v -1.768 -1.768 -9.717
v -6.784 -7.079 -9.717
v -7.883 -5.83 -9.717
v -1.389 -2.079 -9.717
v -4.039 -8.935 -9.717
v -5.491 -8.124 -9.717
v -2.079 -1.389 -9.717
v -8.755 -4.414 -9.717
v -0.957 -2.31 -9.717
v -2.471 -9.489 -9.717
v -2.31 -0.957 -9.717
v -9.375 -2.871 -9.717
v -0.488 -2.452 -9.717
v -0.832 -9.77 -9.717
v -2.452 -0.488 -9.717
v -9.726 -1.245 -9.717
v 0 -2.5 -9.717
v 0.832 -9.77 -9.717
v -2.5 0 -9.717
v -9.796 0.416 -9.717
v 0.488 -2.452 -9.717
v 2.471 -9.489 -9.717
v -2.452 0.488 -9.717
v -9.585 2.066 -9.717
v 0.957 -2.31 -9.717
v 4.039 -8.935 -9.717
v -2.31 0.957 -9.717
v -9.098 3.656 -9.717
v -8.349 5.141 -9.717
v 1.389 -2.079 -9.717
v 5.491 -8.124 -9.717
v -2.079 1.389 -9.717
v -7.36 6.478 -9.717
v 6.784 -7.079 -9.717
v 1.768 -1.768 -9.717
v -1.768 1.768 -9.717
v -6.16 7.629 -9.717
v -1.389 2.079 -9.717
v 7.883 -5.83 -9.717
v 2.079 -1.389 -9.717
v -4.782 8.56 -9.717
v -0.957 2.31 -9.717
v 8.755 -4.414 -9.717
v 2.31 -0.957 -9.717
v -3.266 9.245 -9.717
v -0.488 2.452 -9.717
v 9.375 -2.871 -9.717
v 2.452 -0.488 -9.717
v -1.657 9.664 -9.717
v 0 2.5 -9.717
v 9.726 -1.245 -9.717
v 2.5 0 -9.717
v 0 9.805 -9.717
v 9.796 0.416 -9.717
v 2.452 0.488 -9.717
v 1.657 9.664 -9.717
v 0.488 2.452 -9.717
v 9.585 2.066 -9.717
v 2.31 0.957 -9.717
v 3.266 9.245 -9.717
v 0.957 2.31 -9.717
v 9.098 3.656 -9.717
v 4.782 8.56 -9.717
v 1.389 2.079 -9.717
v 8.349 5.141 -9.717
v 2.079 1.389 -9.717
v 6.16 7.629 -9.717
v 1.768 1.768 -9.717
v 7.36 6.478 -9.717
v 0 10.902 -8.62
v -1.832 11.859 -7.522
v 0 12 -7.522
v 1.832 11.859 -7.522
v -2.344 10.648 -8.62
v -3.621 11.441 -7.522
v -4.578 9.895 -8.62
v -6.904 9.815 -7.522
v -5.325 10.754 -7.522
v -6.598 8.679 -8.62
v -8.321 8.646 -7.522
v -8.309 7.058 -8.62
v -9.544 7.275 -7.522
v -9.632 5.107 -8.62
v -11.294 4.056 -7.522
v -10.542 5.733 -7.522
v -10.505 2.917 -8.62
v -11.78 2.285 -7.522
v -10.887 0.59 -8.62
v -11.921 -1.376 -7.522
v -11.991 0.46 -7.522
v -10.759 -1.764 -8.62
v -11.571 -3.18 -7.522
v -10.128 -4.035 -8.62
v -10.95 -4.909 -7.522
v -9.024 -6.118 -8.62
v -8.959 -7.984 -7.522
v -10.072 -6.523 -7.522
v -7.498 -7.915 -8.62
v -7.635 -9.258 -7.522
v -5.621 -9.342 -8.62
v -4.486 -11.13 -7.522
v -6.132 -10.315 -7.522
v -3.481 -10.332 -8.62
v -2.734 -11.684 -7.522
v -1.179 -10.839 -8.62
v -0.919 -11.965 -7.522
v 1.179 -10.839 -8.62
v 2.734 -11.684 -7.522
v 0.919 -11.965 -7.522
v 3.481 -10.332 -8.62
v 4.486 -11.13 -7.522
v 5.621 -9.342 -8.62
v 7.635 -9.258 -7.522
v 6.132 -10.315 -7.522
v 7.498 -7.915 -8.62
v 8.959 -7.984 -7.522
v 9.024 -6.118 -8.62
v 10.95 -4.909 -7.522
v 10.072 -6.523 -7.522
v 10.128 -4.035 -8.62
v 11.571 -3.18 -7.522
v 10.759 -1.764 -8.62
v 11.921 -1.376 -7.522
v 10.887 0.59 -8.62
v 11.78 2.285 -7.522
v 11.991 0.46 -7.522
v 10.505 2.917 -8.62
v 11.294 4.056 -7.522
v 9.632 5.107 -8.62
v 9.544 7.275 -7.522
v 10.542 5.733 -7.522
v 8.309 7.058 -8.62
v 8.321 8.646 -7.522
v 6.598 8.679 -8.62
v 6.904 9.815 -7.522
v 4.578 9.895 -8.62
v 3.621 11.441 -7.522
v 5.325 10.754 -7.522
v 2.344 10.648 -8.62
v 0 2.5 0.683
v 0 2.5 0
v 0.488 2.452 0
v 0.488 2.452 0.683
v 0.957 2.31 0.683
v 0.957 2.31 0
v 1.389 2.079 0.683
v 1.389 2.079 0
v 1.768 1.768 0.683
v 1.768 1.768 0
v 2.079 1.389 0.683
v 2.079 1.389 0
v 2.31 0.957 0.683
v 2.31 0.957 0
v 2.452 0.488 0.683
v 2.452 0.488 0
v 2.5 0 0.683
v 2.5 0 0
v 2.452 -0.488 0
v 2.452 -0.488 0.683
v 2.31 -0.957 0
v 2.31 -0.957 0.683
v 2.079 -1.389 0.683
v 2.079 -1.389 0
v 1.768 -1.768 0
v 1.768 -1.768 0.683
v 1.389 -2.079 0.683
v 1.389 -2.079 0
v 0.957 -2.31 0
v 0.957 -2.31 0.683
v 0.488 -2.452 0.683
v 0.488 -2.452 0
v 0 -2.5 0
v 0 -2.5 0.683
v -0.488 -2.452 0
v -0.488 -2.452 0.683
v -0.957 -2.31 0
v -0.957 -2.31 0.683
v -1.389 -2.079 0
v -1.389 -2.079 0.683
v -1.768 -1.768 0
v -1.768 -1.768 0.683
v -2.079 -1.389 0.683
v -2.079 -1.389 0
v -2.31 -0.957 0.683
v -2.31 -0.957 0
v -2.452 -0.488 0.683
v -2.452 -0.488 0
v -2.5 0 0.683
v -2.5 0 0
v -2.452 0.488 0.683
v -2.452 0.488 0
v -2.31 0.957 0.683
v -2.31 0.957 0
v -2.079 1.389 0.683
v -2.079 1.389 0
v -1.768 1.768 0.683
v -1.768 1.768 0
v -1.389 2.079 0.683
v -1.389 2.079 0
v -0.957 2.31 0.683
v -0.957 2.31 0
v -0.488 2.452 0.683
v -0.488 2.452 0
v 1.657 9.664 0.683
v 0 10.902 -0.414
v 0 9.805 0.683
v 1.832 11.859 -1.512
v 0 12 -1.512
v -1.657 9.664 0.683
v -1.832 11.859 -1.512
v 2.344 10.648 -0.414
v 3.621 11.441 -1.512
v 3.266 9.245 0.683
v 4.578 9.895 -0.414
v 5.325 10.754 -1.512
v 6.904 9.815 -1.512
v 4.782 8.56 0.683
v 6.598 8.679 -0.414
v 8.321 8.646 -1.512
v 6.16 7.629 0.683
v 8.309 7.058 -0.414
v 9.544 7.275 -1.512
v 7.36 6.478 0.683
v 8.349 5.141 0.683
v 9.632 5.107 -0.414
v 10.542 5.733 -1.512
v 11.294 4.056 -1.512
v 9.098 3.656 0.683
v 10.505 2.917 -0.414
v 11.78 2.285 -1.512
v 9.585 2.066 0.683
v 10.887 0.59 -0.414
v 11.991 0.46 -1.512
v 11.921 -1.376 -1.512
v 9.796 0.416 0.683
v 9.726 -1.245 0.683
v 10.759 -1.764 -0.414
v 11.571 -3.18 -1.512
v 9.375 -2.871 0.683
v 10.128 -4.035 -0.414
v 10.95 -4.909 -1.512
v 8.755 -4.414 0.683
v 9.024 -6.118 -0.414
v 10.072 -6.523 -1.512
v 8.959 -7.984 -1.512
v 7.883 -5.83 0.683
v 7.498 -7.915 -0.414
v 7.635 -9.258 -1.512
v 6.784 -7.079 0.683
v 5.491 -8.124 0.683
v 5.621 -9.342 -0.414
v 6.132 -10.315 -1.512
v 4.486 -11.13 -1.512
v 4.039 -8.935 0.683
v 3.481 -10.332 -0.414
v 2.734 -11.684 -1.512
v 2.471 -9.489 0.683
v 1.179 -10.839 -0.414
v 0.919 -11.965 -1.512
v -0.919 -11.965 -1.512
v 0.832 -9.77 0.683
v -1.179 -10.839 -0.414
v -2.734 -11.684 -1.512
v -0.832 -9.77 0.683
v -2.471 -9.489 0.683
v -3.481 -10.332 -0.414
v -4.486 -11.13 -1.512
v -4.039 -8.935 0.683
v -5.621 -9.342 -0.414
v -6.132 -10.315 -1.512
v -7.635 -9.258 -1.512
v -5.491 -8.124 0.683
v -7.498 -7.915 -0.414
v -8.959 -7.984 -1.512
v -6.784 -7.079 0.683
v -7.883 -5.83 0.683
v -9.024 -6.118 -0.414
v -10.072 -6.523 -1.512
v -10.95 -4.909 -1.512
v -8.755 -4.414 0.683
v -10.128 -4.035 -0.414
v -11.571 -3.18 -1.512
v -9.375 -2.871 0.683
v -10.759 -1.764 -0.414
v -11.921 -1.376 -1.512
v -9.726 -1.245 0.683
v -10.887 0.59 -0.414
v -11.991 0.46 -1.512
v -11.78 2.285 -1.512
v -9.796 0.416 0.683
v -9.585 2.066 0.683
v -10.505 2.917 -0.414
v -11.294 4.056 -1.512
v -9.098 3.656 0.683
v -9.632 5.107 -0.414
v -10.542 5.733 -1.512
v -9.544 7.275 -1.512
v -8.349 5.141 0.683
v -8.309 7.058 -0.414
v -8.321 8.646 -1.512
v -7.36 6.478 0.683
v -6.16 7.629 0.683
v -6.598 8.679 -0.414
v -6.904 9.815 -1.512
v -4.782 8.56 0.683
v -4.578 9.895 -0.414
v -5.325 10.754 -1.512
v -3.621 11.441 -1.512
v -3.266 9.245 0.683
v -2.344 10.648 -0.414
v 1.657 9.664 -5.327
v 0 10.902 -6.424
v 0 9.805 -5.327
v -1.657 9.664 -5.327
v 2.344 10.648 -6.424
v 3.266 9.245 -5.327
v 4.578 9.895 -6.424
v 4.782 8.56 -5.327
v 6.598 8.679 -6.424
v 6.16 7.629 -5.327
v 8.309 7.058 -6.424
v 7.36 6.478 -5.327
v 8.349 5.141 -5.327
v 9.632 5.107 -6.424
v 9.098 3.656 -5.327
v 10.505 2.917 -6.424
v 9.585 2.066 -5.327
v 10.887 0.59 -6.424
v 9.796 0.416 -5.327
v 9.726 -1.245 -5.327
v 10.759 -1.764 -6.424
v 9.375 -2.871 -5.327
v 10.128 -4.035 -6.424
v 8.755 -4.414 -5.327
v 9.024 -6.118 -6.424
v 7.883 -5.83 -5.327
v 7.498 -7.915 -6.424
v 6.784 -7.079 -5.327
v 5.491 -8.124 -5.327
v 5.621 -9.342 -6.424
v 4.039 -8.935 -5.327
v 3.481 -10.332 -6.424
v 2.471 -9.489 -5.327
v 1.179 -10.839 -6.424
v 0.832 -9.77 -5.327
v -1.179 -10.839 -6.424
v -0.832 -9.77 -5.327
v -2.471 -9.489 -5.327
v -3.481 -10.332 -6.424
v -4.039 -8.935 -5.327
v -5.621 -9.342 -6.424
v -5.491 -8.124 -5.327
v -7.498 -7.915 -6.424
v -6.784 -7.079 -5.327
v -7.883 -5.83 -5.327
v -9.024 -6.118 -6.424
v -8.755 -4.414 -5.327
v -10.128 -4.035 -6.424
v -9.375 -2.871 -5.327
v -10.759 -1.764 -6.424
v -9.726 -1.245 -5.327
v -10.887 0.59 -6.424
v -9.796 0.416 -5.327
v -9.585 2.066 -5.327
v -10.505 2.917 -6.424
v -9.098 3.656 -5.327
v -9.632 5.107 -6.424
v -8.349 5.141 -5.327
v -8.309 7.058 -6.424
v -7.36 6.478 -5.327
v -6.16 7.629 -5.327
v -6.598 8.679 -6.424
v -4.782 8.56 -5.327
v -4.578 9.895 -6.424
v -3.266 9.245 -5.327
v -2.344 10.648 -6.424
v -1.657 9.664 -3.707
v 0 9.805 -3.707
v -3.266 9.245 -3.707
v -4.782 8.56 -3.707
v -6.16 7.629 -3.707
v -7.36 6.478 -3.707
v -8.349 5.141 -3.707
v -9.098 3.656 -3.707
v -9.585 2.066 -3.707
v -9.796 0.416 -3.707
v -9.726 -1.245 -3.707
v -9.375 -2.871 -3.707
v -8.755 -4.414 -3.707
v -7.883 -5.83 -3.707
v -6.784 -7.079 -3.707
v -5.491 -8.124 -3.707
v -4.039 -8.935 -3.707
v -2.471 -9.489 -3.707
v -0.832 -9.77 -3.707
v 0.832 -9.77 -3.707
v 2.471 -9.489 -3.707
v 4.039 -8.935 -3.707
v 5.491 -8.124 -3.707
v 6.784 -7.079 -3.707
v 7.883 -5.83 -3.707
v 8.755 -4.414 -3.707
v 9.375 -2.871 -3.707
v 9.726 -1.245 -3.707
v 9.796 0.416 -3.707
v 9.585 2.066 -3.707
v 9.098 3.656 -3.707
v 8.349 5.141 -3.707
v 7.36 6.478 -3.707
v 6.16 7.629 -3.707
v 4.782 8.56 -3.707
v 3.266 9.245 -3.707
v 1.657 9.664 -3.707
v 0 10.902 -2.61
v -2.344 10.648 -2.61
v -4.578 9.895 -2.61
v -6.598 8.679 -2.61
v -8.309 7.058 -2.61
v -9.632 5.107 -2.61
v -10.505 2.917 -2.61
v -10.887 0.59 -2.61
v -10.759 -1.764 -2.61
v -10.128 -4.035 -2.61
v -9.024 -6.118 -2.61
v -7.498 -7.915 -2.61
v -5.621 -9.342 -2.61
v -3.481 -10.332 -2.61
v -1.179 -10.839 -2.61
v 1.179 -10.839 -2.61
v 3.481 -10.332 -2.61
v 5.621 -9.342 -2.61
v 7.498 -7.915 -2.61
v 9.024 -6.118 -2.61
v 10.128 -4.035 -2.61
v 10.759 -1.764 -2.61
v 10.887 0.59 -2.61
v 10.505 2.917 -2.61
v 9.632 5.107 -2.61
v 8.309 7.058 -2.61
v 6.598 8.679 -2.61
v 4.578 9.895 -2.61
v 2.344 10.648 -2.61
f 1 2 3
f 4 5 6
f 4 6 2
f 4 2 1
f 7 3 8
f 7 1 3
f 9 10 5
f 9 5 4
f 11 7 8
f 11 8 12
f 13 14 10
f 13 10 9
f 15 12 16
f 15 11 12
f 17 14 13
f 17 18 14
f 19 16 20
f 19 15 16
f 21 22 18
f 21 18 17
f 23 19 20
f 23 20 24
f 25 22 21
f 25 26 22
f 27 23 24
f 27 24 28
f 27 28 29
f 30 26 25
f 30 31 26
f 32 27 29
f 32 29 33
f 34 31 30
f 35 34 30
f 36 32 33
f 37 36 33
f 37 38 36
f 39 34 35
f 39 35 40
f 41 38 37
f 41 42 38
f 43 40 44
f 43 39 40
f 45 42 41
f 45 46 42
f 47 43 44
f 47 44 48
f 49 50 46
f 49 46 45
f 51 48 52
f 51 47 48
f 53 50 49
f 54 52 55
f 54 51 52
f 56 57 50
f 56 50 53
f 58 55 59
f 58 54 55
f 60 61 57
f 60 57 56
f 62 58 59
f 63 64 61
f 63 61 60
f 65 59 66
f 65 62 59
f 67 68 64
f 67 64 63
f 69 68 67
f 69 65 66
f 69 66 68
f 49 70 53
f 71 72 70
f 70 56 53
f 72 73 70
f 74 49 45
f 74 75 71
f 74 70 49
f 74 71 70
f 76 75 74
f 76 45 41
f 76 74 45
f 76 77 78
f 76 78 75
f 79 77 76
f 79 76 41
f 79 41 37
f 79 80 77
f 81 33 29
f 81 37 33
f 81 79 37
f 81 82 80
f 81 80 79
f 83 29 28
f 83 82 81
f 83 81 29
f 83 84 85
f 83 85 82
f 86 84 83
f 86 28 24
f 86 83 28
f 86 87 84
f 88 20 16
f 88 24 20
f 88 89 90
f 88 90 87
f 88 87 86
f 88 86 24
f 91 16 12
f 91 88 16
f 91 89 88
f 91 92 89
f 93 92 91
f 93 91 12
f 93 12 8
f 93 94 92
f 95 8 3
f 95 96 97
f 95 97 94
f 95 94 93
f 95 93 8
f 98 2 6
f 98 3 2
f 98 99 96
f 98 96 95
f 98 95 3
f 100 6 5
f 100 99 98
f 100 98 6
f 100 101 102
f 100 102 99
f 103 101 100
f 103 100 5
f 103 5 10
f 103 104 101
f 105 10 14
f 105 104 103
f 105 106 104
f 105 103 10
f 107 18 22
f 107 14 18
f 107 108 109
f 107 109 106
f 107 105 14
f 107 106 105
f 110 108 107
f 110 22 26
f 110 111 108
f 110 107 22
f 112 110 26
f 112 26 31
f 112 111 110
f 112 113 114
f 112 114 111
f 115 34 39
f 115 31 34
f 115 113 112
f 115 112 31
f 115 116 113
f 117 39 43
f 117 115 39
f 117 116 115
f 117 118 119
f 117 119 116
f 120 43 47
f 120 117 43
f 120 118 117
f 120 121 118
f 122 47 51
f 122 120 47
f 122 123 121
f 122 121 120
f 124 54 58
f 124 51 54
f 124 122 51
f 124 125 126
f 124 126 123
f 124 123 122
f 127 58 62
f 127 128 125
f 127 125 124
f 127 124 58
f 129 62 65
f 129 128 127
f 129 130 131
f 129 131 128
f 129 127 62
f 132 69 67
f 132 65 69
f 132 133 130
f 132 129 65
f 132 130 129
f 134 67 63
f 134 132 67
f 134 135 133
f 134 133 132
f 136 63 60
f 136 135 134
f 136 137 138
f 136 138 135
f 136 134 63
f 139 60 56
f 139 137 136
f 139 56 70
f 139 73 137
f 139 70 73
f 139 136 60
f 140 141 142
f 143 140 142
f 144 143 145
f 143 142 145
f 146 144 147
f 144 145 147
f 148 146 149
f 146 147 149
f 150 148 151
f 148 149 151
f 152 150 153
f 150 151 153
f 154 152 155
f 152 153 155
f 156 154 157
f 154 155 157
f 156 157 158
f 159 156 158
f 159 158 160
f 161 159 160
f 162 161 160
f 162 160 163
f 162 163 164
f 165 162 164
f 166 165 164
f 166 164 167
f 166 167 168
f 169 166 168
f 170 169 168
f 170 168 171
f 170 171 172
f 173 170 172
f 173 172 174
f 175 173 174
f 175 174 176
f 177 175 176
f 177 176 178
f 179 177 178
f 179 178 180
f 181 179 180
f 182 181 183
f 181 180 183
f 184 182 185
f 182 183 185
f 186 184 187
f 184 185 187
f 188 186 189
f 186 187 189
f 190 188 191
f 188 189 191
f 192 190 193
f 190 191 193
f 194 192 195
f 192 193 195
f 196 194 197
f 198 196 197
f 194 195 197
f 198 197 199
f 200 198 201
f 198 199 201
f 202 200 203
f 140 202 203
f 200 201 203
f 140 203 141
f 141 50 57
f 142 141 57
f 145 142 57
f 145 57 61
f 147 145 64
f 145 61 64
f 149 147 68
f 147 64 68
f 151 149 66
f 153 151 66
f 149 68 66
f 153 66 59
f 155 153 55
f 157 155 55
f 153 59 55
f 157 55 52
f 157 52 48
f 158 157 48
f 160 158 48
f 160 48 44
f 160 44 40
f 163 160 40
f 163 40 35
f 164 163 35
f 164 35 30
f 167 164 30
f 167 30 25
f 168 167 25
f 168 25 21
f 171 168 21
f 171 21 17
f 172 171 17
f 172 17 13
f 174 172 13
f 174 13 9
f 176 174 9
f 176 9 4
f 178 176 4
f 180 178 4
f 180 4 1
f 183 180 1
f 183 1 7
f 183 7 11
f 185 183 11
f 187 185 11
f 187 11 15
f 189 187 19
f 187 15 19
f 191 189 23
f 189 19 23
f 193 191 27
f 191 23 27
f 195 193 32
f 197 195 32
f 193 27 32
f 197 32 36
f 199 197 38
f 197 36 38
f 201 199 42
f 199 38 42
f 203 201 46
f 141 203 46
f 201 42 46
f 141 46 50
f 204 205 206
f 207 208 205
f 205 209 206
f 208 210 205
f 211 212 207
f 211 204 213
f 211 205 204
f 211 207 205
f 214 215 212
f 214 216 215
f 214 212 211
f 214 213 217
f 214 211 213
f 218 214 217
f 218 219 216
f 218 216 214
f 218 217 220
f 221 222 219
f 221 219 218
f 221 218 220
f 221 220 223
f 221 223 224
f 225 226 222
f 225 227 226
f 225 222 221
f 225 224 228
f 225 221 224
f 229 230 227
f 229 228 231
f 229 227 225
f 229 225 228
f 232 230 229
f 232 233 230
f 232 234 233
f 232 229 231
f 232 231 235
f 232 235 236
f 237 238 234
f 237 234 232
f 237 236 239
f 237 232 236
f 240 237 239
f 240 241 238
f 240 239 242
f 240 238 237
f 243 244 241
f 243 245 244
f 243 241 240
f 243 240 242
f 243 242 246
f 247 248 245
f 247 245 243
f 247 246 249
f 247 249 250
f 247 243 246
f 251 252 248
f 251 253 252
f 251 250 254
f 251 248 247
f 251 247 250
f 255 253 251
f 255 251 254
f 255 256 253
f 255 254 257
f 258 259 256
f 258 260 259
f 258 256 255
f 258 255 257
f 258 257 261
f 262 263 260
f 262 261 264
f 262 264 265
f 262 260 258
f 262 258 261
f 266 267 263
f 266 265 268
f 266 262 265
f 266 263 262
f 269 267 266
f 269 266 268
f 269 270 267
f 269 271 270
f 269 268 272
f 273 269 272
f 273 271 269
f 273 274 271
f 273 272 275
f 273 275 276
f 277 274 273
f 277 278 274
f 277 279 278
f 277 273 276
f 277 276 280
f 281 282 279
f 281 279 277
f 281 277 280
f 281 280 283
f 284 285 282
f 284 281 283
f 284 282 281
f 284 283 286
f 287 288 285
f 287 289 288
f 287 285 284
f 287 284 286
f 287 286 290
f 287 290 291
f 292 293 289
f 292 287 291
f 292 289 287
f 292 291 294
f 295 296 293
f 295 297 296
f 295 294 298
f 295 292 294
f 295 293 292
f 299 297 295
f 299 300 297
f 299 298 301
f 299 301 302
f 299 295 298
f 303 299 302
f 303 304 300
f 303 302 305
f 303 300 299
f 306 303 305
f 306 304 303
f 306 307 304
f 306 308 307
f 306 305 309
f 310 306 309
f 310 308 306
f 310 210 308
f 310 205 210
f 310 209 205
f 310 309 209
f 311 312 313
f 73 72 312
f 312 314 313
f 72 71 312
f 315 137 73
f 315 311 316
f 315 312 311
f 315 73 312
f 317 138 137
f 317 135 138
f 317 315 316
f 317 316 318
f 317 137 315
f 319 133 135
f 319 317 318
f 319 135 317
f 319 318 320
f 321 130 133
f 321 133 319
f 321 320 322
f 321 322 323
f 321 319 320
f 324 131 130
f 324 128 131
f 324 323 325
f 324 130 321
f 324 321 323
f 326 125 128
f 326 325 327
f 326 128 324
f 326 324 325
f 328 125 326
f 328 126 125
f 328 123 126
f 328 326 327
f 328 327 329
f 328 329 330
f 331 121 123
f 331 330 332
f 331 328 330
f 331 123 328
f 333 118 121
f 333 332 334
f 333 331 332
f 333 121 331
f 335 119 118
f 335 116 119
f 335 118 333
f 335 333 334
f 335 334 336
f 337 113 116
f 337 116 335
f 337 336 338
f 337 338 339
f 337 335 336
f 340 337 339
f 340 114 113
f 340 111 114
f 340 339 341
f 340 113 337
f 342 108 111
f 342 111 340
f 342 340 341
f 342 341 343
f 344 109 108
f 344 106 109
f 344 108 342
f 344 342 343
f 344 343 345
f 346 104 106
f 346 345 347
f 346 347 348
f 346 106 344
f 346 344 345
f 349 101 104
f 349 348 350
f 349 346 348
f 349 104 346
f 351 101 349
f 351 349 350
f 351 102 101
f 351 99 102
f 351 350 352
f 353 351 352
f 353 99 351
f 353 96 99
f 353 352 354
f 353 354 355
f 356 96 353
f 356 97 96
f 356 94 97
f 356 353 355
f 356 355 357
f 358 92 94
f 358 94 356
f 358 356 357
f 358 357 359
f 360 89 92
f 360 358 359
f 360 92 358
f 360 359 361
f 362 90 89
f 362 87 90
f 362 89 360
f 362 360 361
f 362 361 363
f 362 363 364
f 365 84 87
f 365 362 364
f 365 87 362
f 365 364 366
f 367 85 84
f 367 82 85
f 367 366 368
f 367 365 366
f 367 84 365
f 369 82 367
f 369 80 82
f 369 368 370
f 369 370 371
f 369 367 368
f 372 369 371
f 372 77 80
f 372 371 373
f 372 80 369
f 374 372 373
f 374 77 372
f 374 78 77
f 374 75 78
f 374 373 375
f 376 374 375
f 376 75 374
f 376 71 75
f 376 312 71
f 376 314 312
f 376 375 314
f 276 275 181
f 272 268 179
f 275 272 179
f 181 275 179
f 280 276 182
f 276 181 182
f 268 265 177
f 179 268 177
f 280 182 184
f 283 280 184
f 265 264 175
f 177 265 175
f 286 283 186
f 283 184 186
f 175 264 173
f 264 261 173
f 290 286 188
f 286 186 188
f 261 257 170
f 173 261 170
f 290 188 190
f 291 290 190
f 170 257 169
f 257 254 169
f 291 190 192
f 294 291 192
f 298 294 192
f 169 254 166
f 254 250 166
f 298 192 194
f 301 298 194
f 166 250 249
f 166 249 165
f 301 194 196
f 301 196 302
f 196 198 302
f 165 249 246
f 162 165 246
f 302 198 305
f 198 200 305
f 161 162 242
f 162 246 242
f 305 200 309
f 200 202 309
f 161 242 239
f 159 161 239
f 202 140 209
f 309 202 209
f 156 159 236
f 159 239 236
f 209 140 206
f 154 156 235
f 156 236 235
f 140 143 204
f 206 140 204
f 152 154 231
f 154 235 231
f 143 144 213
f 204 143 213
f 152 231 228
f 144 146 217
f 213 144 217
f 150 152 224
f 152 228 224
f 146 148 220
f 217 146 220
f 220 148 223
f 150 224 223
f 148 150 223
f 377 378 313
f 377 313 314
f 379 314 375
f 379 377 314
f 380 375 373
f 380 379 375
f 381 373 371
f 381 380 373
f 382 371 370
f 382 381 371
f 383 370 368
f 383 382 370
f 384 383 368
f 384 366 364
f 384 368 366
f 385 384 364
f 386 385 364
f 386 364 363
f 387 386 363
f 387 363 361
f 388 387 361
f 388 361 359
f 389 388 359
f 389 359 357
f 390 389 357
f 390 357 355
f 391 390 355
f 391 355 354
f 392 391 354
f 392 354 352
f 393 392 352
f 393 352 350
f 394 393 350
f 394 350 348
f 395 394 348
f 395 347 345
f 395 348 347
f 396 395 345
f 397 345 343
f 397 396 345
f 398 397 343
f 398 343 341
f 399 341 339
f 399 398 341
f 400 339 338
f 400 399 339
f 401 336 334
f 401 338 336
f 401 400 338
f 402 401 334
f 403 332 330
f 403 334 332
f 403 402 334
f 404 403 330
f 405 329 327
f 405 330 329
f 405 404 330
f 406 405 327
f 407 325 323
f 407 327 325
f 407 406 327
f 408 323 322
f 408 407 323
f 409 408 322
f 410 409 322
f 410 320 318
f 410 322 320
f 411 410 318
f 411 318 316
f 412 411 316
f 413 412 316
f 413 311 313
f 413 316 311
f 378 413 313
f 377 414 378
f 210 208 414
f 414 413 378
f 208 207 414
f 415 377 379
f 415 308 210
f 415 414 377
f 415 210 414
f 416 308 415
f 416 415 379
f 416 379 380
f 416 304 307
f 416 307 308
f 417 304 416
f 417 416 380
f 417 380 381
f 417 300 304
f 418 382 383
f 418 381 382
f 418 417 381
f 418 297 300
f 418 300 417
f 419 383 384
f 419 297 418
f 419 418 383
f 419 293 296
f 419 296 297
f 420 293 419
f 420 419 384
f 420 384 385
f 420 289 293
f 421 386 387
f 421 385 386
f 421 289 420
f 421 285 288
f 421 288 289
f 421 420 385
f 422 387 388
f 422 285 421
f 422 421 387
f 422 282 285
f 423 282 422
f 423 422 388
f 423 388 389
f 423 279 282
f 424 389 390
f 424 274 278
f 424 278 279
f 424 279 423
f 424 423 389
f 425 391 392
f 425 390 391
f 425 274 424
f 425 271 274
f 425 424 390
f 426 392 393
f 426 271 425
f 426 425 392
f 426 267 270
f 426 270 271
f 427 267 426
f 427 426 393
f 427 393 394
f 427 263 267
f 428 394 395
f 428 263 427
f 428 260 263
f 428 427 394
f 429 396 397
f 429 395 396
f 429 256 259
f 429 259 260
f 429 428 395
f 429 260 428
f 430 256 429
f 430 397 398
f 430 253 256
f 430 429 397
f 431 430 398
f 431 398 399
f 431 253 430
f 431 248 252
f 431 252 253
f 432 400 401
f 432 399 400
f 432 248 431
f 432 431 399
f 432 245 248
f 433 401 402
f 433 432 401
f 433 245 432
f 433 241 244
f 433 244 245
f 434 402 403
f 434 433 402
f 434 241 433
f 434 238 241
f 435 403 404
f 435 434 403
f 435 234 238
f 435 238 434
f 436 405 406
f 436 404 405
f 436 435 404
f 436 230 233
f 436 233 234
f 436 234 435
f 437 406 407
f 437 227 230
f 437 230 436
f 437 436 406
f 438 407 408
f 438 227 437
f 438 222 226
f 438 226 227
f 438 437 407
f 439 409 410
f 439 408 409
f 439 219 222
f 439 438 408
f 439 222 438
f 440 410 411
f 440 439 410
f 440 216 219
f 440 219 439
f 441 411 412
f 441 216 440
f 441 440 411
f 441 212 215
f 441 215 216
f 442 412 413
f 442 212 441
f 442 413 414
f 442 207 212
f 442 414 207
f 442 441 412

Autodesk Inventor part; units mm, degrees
ref_plane "YZ Plane" through (0, 0, 0) normal (1, 0, 0) x (0, 1, 0)
ref_plane "XZ Plane" through (0, 0, 0) normal (0, 1, 0) x (-1, 0, 0)
ref_plane "XY Plane" through (0, 0, 0) normal (0, 0, 1) x (1, 0, 0)
sketch "Sketch1" plane through (0, 0, 0) normal (1, 0, 0) x (0, 1, 0)
  line L0 (0, 0) -> (0, -15.044)
  line L1 (2.5, 0) -> (2.5, -12.9861)
  line L2 (0, -7.522) -> (12, -7.522) construction
  line L3 (0, -1.512) -> (12, -1.512) construction
  line L4 (12, -1.512) -> (9.805, 0.683)
  line L5 (12, -7.522) -> (9.805, -9.717)
  line L6 (12, -1.512) -> (9.805, -3.707)
  line L7 (12, -7.522) -> (9.805, -5.327)
  line L8 (9.805, -5.327) -> (9.805, -3.707)
  line L9 (9.805, 0.683) -> (2.5, 0.683)
  line L10 (2.5, 0.683) -> (2.5, 0)
  line L11 (9.805, -9.717) -> (2.5, -9.717)
  dimension "d0" = 2.5
  dimension "d1" = 12
  dimension "d2" = 6.01
  dimension "d3" = 45
  dimension "d4" = 0
  dimension "d5" = 10.4
revolve "Revolution1" add sketch "Sketch1" angle 360 about axis through (0, 0, 0) along (0, 0, -1)
properties part number "bearingType2Standin"
